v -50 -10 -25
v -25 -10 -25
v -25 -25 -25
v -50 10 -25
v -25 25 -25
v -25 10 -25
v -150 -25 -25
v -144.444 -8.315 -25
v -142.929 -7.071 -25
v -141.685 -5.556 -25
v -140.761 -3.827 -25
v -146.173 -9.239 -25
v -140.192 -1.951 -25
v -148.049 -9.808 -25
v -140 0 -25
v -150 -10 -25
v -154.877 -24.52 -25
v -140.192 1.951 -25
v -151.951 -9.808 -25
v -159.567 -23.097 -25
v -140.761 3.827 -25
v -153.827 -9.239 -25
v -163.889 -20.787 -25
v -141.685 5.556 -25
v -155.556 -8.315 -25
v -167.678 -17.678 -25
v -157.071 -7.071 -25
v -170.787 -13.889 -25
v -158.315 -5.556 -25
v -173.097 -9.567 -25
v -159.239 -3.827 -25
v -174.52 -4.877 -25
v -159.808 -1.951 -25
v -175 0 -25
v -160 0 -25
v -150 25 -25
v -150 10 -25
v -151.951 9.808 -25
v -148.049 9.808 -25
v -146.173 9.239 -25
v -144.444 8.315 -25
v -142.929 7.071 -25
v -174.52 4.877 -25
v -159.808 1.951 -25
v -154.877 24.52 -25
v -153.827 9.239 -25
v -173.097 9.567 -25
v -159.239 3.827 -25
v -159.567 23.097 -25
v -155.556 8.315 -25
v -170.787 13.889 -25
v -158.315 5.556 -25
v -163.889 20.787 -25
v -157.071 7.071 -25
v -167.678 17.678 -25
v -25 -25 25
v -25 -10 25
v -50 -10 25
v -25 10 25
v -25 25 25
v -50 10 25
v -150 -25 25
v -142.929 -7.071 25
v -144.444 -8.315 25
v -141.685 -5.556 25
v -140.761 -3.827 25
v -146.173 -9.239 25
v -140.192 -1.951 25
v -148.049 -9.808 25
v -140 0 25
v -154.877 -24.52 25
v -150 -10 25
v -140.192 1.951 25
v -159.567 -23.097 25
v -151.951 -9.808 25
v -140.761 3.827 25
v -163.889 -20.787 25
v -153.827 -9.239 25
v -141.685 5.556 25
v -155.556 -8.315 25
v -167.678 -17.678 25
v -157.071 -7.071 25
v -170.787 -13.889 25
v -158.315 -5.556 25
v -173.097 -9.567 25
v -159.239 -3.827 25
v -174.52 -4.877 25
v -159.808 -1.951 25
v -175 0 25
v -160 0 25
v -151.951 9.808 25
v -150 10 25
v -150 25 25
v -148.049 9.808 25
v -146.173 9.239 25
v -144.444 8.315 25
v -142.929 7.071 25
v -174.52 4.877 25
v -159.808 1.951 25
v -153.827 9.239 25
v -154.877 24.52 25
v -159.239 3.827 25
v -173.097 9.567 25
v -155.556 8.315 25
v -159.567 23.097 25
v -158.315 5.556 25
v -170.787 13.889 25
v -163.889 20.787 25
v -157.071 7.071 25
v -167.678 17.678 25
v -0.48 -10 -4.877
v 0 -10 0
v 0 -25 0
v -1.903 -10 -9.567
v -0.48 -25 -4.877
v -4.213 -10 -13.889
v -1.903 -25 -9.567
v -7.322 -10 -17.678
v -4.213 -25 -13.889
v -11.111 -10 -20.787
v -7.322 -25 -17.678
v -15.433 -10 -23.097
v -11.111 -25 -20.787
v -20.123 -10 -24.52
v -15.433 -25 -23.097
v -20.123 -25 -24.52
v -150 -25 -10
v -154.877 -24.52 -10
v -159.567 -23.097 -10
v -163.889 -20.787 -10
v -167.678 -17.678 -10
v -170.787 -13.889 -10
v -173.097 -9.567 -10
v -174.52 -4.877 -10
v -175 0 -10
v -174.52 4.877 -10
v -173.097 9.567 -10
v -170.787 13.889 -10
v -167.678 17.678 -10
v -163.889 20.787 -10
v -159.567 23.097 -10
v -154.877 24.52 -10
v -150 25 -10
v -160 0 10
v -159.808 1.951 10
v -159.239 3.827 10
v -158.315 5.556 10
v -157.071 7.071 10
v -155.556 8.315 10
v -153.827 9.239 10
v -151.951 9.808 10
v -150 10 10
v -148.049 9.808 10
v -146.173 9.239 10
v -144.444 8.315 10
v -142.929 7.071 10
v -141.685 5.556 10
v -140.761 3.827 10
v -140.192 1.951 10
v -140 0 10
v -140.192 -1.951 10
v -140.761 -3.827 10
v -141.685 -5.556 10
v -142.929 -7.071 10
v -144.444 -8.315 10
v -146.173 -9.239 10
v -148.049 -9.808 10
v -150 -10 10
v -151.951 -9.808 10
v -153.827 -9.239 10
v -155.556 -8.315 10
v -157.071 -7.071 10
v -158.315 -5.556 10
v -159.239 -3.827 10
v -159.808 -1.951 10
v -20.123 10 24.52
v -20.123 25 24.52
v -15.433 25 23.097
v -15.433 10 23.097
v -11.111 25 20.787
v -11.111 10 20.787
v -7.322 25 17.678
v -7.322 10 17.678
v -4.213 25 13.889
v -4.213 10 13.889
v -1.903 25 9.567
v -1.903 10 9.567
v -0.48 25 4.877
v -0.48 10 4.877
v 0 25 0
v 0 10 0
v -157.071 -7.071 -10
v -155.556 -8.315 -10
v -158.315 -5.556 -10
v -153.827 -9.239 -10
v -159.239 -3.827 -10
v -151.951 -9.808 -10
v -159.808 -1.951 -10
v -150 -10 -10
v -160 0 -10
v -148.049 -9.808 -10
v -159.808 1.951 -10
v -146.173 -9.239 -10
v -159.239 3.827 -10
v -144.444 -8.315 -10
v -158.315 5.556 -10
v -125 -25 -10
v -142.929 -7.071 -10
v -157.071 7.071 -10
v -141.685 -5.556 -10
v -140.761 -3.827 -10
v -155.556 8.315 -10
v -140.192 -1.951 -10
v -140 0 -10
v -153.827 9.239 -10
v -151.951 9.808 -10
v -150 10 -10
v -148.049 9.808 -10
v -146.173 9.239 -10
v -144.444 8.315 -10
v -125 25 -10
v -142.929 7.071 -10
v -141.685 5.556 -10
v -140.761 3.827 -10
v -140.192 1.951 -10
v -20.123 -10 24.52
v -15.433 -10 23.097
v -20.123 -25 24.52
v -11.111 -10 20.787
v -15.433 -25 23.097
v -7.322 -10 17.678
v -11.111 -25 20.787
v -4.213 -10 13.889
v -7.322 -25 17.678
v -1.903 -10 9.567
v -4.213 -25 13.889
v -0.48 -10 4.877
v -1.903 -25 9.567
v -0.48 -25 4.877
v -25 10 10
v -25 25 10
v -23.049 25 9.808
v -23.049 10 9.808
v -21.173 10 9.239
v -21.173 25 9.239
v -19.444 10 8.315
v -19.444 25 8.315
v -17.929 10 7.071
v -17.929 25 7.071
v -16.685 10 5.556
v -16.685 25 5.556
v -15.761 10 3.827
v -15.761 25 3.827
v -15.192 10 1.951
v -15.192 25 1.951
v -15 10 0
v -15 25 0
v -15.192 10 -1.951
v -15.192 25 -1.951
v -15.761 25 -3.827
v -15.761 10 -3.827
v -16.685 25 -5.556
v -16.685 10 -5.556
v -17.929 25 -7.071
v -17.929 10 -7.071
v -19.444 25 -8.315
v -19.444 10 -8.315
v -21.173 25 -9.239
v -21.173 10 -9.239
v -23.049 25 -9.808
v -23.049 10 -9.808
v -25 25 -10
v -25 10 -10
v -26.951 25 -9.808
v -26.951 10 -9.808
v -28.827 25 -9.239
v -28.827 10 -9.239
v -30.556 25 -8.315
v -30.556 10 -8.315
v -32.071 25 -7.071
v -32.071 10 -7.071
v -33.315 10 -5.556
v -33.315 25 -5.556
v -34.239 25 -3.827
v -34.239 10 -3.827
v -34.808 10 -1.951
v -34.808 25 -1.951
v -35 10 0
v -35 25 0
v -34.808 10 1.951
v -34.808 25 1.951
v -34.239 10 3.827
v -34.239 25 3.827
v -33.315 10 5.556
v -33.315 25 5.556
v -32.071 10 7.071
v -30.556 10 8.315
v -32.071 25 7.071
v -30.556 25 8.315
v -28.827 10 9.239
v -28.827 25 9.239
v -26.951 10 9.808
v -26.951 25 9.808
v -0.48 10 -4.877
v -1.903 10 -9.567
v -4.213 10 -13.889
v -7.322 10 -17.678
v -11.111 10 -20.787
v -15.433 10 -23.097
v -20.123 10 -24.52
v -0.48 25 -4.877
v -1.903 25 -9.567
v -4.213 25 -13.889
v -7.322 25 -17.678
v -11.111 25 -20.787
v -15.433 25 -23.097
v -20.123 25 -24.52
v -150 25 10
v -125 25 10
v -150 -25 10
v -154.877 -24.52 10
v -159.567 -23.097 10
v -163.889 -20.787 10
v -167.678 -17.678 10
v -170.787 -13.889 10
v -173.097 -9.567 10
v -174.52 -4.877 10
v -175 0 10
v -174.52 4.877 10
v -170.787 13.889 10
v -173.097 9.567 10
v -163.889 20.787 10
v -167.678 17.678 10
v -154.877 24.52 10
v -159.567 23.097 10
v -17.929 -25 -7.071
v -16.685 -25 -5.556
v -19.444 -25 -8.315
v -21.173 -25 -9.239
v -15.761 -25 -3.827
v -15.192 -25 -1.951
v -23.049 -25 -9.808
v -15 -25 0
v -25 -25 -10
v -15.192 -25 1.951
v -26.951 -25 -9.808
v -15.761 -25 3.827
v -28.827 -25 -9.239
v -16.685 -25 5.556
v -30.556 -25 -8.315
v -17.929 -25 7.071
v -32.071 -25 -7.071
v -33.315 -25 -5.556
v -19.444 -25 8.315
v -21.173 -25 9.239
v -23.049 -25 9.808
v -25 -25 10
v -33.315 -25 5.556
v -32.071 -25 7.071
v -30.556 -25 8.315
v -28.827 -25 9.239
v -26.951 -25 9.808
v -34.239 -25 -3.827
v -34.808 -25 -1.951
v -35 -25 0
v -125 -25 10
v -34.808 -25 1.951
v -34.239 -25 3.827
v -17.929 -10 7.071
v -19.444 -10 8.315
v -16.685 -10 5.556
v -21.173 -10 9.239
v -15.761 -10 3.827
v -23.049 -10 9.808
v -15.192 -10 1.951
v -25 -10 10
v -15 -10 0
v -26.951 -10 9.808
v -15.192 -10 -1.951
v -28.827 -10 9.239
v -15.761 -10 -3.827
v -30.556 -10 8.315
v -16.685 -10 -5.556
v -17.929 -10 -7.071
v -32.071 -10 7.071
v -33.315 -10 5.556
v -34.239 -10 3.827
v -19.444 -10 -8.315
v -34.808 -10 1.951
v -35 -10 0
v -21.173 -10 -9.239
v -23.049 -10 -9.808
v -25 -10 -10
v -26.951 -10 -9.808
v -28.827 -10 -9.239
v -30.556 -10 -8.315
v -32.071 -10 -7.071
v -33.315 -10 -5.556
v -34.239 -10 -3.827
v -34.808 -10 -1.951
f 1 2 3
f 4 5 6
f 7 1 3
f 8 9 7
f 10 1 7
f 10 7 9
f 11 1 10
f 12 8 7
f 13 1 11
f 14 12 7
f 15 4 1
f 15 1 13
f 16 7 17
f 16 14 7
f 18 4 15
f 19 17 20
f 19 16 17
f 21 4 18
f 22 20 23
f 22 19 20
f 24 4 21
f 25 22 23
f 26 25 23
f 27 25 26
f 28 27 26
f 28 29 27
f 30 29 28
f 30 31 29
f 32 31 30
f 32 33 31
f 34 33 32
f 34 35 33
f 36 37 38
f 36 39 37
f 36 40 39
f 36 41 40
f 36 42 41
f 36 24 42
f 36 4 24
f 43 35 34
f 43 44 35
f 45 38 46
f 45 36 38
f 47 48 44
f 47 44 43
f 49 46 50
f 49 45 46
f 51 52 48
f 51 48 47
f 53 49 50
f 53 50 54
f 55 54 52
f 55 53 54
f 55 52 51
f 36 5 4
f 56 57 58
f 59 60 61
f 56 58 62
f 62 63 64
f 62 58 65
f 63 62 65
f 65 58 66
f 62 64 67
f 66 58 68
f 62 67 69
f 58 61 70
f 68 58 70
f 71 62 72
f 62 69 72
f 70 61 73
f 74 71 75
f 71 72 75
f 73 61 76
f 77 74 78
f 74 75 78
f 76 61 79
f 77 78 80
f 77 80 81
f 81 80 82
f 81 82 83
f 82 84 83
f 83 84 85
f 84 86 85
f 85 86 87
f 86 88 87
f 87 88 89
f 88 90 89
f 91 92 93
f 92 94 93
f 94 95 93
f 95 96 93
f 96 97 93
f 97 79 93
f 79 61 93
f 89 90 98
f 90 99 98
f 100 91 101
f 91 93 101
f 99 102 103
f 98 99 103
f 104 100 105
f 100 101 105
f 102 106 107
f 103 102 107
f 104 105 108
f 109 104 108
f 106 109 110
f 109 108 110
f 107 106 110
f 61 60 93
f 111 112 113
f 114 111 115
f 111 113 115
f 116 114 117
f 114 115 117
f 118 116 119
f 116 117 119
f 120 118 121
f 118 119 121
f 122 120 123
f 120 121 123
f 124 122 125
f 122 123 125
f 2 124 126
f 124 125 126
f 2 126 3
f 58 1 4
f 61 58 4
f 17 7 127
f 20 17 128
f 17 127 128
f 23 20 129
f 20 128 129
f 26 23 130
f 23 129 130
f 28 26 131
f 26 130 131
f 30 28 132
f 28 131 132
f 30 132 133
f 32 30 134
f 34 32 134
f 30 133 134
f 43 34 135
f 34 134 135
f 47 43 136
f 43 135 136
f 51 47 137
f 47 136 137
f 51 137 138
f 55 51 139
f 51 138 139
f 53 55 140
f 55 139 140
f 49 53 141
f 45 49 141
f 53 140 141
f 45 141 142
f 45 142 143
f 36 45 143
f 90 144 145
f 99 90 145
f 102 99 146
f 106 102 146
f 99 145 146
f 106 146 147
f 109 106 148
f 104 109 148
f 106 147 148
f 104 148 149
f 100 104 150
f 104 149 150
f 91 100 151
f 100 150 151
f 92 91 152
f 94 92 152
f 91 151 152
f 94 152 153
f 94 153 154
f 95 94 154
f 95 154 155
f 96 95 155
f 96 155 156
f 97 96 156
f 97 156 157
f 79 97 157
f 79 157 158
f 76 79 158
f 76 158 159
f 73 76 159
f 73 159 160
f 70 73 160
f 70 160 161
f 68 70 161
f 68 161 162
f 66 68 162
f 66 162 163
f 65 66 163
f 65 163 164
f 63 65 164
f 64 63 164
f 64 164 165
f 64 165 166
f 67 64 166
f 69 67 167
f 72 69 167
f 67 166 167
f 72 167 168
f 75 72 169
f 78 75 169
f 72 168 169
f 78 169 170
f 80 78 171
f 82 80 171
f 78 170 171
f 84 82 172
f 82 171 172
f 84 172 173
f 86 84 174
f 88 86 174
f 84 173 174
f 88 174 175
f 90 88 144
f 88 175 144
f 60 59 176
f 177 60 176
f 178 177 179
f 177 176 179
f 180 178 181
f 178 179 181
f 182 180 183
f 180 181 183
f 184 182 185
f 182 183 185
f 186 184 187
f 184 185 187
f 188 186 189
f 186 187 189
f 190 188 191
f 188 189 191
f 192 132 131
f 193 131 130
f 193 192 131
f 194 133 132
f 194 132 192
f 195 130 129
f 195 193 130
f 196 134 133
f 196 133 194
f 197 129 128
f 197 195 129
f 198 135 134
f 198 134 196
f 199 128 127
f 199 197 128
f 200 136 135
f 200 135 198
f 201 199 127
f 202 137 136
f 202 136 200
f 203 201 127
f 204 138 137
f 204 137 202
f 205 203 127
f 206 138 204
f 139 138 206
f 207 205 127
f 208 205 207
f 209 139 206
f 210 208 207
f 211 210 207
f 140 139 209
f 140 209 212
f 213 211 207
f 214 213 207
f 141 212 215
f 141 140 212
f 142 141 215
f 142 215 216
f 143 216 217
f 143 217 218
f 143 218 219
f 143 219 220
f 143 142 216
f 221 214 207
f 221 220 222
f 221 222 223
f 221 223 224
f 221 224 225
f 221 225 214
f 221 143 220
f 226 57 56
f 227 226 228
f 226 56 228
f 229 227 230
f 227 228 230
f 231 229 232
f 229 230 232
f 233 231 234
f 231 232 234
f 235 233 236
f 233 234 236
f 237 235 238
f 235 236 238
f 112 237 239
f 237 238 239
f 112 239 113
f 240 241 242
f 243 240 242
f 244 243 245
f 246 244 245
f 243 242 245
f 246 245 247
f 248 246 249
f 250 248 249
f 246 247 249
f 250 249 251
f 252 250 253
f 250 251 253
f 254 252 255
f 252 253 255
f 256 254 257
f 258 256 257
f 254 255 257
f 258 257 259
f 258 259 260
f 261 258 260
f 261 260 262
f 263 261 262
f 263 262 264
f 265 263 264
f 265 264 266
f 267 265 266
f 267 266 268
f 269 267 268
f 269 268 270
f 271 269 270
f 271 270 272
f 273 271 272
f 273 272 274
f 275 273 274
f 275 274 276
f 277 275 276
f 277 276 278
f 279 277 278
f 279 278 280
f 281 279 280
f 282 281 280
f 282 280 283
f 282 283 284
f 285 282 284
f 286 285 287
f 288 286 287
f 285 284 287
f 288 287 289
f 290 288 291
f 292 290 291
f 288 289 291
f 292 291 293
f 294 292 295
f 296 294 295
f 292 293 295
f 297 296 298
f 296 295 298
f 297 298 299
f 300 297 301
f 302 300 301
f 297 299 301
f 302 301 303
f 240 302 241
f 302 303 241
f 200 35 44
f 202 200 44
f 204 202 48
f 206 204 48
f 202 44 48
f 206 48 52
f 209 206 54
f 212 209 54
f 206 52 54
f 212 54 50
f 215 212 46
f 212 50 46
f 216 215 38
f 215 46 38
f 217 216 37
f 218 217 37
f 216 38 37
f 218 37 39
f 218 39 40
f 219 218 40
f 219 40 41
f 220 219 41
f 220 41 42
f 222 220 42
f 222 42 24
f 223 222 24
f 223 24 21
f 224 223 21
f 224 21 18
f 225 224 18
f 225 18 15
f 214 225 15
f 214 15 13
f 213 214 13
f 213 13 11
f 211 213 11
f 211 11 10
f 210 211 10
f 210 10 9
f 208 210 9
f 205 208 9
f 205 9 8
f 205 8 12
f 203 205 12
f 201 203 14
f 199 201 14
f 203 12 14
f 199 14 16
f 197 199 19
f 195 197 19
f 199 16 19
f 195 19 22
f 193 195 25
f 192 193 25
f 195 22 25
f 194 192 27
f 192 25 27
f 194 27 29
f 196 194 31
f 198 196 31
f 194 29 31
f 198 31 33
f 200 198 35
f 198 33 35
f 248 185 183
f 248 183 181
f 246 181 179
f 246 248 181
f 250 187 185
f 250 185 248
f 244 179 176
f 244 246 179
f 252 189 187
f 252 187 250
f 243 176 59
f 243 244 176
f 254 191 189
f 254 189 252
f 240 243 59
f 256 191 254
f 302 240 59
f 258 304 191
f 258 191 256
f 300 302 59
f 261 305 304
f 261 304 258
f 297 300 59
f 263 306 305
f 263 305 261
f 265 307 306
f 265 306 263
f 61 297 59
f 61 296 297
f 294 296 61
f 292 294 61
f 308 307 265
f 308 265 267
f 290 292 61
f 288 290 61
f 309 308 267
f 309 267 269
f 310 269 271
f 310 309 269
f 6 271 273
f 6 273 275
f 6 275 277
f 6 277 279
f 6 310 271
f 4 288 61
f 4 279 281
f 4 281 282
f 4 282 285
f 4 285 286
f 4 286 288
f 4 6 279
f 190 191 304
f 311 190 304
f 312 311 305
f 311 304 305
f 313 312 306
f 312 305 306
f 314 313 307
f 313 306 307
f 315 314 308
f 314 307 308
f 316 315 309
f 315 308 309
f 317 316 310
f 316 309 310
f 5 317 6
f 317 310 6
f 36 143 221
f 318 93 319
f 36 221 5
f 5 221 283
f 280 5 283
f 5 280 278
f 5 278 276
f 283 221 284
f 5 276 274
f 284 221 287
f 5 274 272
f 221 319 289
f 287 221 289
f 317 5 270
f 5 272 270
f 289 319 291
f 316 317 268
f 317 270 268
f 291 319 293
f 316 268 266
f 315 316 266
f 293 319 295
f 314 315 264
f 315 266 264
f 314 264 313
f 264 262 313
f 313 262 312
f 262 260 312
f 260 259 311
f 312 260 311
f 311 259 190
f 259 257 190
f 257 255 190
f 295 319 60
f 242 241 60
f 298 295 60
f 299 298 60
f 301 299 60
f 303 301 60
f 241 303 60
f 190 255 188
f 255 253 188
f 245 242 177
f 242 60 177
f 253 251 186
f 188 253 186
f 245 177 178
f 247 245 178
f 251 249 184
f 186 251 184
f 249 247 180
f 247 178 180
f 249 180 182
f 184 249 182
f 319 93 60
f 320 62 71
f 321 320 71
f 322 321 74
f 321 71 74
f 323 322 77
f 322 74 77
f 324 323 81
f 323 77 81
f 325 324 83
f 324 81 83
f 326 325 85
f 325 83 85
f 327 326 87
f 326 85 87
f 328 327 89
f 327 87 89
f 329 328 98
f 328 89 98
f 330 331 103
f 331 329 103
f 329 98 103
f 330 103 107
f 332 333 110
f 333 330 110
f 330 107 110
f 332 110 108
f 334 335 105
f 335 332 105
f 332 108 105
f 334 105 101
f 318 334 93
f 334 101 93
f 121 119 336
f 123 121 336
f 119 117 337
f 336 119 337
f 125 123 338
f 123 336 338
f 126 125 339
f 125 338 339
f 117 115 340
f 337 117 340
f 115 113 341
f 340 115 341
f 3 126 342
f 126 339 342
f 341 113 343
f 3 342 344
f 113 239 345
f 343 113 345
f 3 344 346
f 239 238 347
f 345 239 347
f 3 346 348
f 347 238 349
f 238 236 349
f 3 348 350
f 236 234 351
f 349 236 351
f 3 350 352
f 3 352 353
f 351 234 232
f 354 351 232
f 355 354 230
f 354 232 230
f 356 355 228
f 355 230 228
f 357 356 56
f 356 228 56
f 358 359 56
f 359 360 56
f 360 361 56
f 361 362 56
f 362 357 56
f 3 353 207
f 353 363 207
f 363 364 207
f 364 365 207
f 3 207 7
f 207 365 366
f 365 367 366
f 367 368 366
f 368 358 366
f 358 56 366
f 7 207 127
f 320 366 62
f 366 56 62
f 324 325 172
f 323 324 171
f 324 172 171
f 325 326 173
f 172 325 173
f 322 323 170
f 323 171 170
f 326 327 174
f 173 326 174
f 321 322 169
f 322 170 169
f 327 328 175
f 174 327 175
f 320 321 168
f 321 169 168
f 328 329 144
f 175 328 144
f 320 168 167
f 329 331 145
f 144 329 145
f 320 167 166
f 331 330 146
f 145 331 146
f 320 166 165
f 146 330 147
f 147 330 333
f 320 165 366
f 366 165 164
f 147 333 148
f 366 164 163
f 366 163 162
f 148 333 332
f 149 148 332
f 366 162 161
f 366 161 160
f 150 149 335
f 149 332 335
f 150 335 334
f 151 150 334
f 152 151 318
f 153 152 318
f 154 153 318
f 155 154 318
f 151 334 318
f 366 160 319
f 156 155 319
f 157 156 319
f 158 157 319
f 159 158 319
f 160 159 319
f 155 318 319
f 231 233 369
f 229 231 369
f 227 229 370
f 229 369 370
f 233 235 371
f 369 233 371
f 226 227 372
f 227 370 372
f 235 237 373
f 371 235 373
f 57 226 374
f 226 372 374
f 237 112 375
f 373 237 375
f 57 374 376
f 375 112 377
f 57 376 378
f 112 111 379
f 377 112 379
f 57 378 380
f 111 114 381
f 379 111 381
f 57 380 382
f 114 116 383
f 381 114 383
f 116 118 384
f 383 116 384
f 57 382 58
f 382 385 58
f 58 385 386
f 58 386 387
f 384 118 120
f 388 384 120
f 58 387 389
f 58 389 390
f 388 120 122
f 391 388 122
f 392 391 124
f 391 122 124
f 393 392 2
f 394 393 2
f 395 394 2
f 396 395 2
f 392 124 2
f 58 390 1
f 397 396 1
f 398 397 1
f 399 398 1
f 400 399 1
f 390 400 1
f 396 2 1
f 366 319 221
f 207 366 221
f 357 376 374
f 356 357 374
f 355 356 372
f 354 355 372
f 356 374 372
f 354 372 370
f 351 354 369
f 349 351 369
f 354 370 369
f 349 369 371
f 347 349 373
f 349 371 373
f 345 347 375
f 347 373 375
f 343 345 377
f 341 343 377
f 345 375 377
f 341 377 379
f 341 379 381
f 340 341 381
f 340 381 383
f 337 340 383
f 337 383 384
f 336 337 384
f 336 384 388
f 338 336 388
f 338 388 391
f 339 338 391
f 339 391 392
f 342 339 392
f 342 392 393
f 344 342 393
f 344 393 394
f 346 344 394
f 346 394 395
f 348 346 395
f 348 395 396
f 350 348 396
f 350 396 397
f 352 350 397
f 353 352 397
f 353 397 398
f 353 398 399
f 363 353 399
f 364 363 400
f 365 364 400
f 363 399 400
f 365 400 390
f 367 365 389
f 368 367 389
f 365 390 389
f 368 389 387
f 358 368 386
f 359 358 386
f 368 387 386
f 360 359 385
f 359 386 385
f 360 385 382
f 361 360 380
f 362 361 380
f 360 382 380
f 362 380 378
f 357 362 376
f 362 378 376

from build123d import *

# Parameters (mm, degrees)
BOSS_EXTRUDE1_DEPTH              = 25
FILLET1_R                        = 25
SKETCH4_W                        = 61.258938573
SKETCH4_H                        = 20
CUT_EXTRUDE1_DEPTH               = 50
SKETCH5_W                        = 61.074850192
SKETCH5_H                        = 20
CUT_EXTRUDE2_DEPTH               = 50
F_20_0MM_DOWEL_HOLE1_D           = 20
F_20_0MM_DOWEL_HOLE1_ON_FACE_2_D = 20


with BuildPart() as part:
    # Sketch1 → Boss-Extrude1 (new, symmetric)
    with BuildSketch(Plane.XY):
        with BuildLine():
            Line((-150, 25), (0, 25))
            Line((0, 25), (0, -25))
            Line((0, -25), (-149.999982985, -25))
            ThreePointArc((-149.999982985, -25), (-174.999982985, -8.507e-06), (-150, 25))
        make_face()
    extrude(amount=BOSS_EXTRUDE1_DEPTH, both=True)

    # Fillet1
    fillet1_edges = [part.edges().sort_by_distance(p)[0] for p in [
        (0, 0, -25),
        (0, 0, 25),
    ]]
    fillet(fillet1_edges, radius=FILLET1_R - 0.0001)  # a hair under: the kernel refuses the full size

    # Sketch4 → Cut-Extrude1 (cut)
    with BuildSketch(Plane(origin=(0, 25, 0), x_dir=(1, 0, 0), z_dir=(0, 1, 0))):
        with Locations((-155.629452272, 0)):
            Rectangle(SKETCH4_W, SKETCH4_H)
    extrude(amount=-CUT_EXTRUDE1_DEPTH, mode=Mode.SUBTRACT)

    # Sketch5 → Cut-Extrude2 (cut)
    with BuildSketch(Plane(origin=(0, 0, -25), x_dir=(-1, 0, 0), z_dir=(0, 0, -1))):
        with Locations((19.462574904, 0)):
            Rectangle(SKETCH5_W, SKETCH5_H)
    extrude(amount=-CUT_EXTRUDE2_DEPTH, mode=Mode.SUBTRACT)

    # Ø20.0mm Dowel Hole1 (through all)
    with Locations(Plane(origin=(-149.999982985, 0, 25), x_dir=(1, 0, 0), z_dir=(0, 0, 1))):
        with Locations((0, 0)):
            Hole(F_20_0MM_DOWEL_HOLE1_D / 2)

    # Ø20.0mm Dowel Hole1 on face 2 (through all)
    with Locations(Plane(origin=(-25, -25, 0), x_dir=(0, 0, -1), z_dir=(0, -1, 0))):
        with Locations((0, 0)):
            Hole(F_20_0MM_DOWEL_HOLE1_ON_FACE_2_D / 2)


solid = part.part
